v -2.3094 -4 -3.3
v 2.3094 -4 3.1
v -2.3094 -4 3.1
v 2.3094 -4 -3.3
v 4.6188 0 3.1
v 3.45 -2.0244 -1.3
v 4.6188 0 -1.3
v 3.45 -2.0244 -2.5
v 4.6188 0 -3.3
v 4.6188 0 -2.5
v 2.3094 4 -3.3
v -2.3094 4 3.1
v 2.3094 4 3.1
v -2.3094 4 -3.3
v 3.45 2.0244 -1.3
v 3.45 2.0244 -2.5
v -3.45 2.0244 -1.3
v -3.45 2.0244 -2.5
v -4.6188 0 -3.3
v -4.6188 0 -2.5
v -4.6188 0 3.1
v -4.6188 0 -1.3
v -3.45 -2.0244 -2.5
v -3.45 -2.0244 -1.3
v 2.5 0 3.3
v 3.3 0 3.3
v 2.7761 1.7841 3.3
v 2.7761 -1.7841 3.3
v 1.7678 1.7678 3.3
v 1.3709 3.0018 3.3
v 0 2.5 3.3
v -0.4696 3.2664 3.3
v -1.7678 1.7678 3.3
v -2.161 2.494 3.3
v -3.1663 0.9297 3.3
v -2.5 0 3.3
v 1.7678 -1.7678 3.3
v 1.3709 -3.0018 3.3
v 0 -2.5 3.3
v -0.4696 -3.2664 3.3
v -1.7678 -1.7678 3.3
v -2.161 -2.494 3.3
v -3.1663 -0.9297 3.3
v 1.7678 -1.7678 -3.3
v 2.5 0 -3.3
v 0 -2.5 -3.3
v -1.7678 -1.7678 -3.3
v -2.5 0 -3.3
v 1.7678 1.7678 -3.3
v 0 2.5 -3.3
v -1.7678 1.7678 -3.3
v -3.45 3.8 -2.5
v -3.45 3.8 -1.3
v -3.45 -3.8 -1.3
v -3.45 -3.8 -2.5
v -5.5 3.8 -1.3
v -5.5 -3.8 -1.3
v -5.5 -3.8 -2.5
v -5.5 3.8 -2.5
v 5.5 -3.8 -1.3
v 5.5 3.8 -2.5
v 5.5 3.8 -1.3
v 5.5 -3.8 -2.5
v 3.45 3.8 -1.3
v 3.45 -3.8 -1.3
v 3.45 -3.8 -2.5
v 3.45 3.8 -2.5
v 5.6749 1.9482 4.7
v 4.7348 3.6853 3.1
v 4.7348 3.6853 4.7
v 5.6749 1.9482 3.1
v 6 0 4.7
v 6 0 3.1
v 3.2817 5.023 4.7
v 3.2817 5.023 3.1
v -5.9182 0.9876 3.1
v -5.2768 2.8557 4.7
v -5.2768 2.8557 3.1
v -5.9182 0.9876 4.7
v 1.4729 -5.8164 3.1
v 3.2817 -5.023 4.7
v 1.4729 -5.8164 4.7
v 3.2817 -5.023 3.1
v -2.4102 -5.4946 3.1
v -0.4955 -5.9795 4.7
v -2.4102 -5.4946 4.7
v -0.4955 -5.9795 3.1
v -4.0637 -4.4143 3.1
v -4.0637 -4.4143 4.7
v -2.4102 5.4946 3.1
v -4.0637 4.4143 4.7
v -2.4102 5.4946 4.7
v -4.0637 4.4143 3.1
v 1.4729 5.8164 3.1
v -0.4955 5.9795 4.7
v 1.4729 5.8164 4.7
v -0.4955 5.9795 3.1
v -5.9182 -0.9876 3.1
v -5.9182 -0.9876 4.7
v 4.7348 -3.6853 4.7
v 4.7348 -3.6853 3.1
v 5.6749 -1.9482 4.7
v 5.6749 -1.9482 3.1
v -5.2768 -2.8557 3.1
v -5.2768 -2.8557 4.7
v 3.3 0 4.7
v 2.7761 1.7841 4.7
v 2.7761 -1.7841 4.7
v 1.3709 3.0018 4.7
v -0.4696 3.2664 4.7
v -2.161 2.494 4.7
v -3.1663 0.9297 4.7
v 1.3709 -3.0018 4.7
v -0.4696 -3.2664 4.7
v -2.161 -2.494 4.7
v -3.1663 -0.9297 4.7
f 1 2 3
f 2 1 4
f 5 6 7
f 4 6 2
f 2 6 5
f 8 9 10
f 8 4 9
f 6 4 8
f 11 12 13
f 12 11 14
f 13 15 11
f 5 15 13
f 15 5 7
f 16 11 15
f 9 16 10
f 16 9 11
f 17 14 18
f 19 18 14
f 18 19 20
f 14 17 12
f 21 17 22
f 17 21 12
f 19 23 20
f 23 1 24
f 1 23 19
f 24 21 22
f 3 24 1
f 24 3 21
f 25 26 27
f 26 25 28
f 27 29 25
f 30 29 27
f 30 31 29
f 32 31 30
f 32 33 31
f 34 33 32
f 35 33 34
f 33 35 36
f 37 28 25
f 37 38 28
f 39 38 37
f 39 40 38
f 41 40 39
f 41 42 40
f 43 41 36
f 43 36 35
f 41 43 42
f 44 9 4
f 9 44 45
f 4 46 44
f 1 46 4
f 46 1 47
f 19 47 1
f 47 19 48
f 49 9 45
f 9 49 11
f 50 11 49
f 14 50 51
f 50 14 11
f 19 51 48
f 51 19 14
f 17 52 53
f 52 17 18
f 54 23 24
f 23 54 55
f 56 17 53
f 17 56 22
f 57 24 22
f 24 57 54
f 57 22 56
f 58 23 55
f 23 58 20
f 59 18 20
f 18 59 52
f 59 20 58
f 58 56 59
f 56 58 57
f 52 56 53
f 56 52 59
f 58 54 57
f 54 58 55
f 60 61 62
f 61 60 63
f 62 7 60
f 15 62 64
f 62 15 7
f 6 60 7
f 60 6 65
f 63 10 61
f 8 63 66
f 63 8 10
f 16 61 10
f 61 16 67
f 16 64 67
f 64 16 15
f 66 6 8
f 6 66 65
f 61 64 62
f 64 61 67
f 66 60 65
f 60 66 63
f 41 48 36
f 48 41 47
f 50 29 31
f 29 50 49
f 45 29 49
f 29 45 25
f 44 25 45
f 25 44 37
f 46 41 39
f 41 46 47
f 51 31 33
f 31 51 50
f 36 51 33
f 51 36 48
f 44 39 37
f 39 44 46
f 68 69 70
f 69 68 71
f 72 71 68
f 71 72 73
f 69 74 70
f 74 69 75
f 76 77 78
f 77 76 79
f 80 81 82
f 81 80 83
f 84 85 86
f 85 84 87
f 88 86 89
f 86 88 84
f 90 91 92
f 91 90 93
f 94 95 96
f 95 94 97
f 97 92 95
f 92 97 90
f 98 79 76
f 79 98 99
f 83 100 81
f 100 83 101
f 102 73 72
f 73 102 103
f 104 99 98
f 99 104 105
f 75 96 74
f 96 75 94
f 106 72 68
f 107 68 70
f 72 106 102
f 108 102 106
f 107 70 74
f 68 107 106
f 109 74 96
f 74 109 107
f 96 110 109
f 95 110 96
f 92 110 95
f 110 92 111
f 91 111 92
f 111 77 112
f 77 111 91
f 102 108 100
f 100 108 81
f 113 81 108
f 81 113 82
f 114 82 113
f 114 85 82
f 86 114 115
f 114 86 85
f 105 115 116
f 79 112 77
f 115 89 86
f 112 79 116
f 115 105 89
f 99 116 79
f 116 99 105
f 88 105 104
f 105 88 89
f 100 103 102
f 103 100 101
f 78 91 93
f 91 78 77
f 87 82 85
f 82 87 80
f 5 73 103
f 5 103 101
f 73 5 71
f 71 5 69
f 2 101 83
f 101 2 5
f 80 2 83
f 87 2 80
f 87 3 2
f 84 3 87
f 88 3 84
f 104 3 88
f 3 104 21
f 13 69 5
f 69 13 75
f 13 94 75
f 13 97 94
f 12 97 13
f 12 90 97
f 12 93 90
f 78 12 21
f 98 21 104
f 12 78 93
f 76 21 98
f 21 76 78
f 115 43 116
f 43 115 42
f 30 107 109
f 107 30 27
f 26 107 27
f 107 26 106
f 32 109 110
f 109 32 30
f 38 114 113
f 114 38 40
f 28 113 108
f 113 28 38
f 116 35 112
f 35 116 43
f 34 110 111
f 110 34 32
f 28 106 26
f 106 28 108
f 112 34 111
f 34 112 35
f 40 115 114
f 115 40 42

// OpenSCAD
// Parameters
screw_thread_diameter = 6; //[3:12:0.1]
thread_pitch = 1; //[0.5:2:0.1]
across_flats = 8; //[4:16:0.1]
thickness = 6.6; //[3.3:13.2:0.1]
thread_tap_drill_diameter = 5; //[2.5:10:0.1]
thread_clearance_diameter = 6.6; //[3.3:13.2:0.1]
chamfer = 0.3; //[0.1:1.2:0.1]
fillet_radius = 0.5; //[0.2:2:0.1]
t_slot_clearance = 0.2; //[0.05:0.6:0.05]
t_slot_width = 13; //[8:26:0.1]
t_slot_neck_width = 8.5; //[5:17:0.1]
t_slot_depth = 7; //[4:14:0.1]
t_slot_lip_height = 1.2; //[0.6:2.4:0.1]
overlap = 0.8; //[0.5:2:0.1]
washer_outer_diameter = 12; //[6:24:0.1]
washer_thickness = 1.6; //[0.8:3.2:0.1]
washer_hole_diameter = 6.6; //[3.3:13.2:0.1]
assembly_gap = 0.6; //[0.2:2:0.1]

// Hex profile for nut body
module hex_profile_across_flats_8mm() {
  color("DimGray") {
    cylinder(r=across_flats/(2*cos(30)), h=thickness, center=true, $fn=6);
  }
}

// T-slot retention lips
module t_slot_retention_lip_left() {
  color("DimGray") {
    translate([-(t_slot_neck_width/2 + ((t_slot_width - t_slot_neck_width)/2 - t_slot_clearance)/2 - overlap), 0, -(thickness/2 - t_slot_lip_height/2 - overlap)])
      cube([(t_slot_width - t_slot_neck_width)/2 - t_slot_clearance, across_flats - 2*t_slot_clearance, t_slot_lip_height], center=true);
  }
}

module t_slot_retention_lip_right() {
  color("DimGray") {
    translate([(t_slot_neck_width/2 + ((t_slot_width - t_slot_neck_width)/2 - t_slot_clearance)/2 - overlap), 0, -(thickness/2 - t_slot_lip_height/2 - overlap)])
      cube([(t_slot_width - t_slot_neck_width)/2 - t_slot_clearance, across_flats - 2*t_slot_clearance, t_slot_lip_height], center=true);
  }
}

// Threaded hole
module threaded_hole_m6() {
  color("Black") {
    cylinder(r=thread_tap_drill_diameter/2, h=thickness + 2*overlap, center=true);
  }
}

// Lead-in chamfers
module lead_in_chamfer_top() {
  color("Black") {
    translate([0, 0, thickness/2 - chamfer/2 + overlap])
      cylinder(r1=thread_tap_drill_diameter/2 + chamfer, r2=thread_tap_drill_diameter/2, h=chamfer, center=true);
  }
}

module lead_in_chamfer_bottom() {
  color("Black") {
    translate([0, 0, -(thickness/2 - chamfer/2 + overlap)])
      cylinder(r1=thread_tap_drill_diameter/2 + chamfer, r2=thread_tap_drill_diameter/2, h=chamfer, center=true);
  }
}

// Washer
module washer_outer() {
  color("Silver") {
    translate([0, 0, thickness/2 + assembly_gap + washer_thickness/2 - overlap])
      cylinder(r=washer_outer_diameter/2, h=washer_thickness, center=true);
  }
}

module washer_hole() {
  color("Black") {
    translate([0, 0, thickness/2 + assembly_gap + washer_thickness/2 - overlap])
      cylinder(r=washer_hole_diameter/2, h=washer_thickness + 2*overlap, center=true);
  }
}

// T-slot nut body
module t_slot_nut_body() {
  union() {
    hex_profile_across_flats_8mm();
    t_slot_retention_lip_left();
    t_slot_retention_lip_right();
  }
}

// T-slot nut body with thread and chamfers
module t_slot_nut_body_with_thread_and_chamfers() {
  difference() {
    t_slot_nut_body();
    threaded_hole_m6();
    lead_in_chamfer_top();
    lead_in_chamfer_bottom();
  }
}

// Washer solid
module washer_solid() {
  difference() {
    washer_outer();
    washer_hole();
  }
}

// Nut and washer assembly
module nut_and_washer() {
  union() {
    t_slot_nut_body_with_thread_and_chamfers();
    washer_solid();
  }
}

// Final assembly
module assembly() {
  nut_and_washer();
}

assembly();
